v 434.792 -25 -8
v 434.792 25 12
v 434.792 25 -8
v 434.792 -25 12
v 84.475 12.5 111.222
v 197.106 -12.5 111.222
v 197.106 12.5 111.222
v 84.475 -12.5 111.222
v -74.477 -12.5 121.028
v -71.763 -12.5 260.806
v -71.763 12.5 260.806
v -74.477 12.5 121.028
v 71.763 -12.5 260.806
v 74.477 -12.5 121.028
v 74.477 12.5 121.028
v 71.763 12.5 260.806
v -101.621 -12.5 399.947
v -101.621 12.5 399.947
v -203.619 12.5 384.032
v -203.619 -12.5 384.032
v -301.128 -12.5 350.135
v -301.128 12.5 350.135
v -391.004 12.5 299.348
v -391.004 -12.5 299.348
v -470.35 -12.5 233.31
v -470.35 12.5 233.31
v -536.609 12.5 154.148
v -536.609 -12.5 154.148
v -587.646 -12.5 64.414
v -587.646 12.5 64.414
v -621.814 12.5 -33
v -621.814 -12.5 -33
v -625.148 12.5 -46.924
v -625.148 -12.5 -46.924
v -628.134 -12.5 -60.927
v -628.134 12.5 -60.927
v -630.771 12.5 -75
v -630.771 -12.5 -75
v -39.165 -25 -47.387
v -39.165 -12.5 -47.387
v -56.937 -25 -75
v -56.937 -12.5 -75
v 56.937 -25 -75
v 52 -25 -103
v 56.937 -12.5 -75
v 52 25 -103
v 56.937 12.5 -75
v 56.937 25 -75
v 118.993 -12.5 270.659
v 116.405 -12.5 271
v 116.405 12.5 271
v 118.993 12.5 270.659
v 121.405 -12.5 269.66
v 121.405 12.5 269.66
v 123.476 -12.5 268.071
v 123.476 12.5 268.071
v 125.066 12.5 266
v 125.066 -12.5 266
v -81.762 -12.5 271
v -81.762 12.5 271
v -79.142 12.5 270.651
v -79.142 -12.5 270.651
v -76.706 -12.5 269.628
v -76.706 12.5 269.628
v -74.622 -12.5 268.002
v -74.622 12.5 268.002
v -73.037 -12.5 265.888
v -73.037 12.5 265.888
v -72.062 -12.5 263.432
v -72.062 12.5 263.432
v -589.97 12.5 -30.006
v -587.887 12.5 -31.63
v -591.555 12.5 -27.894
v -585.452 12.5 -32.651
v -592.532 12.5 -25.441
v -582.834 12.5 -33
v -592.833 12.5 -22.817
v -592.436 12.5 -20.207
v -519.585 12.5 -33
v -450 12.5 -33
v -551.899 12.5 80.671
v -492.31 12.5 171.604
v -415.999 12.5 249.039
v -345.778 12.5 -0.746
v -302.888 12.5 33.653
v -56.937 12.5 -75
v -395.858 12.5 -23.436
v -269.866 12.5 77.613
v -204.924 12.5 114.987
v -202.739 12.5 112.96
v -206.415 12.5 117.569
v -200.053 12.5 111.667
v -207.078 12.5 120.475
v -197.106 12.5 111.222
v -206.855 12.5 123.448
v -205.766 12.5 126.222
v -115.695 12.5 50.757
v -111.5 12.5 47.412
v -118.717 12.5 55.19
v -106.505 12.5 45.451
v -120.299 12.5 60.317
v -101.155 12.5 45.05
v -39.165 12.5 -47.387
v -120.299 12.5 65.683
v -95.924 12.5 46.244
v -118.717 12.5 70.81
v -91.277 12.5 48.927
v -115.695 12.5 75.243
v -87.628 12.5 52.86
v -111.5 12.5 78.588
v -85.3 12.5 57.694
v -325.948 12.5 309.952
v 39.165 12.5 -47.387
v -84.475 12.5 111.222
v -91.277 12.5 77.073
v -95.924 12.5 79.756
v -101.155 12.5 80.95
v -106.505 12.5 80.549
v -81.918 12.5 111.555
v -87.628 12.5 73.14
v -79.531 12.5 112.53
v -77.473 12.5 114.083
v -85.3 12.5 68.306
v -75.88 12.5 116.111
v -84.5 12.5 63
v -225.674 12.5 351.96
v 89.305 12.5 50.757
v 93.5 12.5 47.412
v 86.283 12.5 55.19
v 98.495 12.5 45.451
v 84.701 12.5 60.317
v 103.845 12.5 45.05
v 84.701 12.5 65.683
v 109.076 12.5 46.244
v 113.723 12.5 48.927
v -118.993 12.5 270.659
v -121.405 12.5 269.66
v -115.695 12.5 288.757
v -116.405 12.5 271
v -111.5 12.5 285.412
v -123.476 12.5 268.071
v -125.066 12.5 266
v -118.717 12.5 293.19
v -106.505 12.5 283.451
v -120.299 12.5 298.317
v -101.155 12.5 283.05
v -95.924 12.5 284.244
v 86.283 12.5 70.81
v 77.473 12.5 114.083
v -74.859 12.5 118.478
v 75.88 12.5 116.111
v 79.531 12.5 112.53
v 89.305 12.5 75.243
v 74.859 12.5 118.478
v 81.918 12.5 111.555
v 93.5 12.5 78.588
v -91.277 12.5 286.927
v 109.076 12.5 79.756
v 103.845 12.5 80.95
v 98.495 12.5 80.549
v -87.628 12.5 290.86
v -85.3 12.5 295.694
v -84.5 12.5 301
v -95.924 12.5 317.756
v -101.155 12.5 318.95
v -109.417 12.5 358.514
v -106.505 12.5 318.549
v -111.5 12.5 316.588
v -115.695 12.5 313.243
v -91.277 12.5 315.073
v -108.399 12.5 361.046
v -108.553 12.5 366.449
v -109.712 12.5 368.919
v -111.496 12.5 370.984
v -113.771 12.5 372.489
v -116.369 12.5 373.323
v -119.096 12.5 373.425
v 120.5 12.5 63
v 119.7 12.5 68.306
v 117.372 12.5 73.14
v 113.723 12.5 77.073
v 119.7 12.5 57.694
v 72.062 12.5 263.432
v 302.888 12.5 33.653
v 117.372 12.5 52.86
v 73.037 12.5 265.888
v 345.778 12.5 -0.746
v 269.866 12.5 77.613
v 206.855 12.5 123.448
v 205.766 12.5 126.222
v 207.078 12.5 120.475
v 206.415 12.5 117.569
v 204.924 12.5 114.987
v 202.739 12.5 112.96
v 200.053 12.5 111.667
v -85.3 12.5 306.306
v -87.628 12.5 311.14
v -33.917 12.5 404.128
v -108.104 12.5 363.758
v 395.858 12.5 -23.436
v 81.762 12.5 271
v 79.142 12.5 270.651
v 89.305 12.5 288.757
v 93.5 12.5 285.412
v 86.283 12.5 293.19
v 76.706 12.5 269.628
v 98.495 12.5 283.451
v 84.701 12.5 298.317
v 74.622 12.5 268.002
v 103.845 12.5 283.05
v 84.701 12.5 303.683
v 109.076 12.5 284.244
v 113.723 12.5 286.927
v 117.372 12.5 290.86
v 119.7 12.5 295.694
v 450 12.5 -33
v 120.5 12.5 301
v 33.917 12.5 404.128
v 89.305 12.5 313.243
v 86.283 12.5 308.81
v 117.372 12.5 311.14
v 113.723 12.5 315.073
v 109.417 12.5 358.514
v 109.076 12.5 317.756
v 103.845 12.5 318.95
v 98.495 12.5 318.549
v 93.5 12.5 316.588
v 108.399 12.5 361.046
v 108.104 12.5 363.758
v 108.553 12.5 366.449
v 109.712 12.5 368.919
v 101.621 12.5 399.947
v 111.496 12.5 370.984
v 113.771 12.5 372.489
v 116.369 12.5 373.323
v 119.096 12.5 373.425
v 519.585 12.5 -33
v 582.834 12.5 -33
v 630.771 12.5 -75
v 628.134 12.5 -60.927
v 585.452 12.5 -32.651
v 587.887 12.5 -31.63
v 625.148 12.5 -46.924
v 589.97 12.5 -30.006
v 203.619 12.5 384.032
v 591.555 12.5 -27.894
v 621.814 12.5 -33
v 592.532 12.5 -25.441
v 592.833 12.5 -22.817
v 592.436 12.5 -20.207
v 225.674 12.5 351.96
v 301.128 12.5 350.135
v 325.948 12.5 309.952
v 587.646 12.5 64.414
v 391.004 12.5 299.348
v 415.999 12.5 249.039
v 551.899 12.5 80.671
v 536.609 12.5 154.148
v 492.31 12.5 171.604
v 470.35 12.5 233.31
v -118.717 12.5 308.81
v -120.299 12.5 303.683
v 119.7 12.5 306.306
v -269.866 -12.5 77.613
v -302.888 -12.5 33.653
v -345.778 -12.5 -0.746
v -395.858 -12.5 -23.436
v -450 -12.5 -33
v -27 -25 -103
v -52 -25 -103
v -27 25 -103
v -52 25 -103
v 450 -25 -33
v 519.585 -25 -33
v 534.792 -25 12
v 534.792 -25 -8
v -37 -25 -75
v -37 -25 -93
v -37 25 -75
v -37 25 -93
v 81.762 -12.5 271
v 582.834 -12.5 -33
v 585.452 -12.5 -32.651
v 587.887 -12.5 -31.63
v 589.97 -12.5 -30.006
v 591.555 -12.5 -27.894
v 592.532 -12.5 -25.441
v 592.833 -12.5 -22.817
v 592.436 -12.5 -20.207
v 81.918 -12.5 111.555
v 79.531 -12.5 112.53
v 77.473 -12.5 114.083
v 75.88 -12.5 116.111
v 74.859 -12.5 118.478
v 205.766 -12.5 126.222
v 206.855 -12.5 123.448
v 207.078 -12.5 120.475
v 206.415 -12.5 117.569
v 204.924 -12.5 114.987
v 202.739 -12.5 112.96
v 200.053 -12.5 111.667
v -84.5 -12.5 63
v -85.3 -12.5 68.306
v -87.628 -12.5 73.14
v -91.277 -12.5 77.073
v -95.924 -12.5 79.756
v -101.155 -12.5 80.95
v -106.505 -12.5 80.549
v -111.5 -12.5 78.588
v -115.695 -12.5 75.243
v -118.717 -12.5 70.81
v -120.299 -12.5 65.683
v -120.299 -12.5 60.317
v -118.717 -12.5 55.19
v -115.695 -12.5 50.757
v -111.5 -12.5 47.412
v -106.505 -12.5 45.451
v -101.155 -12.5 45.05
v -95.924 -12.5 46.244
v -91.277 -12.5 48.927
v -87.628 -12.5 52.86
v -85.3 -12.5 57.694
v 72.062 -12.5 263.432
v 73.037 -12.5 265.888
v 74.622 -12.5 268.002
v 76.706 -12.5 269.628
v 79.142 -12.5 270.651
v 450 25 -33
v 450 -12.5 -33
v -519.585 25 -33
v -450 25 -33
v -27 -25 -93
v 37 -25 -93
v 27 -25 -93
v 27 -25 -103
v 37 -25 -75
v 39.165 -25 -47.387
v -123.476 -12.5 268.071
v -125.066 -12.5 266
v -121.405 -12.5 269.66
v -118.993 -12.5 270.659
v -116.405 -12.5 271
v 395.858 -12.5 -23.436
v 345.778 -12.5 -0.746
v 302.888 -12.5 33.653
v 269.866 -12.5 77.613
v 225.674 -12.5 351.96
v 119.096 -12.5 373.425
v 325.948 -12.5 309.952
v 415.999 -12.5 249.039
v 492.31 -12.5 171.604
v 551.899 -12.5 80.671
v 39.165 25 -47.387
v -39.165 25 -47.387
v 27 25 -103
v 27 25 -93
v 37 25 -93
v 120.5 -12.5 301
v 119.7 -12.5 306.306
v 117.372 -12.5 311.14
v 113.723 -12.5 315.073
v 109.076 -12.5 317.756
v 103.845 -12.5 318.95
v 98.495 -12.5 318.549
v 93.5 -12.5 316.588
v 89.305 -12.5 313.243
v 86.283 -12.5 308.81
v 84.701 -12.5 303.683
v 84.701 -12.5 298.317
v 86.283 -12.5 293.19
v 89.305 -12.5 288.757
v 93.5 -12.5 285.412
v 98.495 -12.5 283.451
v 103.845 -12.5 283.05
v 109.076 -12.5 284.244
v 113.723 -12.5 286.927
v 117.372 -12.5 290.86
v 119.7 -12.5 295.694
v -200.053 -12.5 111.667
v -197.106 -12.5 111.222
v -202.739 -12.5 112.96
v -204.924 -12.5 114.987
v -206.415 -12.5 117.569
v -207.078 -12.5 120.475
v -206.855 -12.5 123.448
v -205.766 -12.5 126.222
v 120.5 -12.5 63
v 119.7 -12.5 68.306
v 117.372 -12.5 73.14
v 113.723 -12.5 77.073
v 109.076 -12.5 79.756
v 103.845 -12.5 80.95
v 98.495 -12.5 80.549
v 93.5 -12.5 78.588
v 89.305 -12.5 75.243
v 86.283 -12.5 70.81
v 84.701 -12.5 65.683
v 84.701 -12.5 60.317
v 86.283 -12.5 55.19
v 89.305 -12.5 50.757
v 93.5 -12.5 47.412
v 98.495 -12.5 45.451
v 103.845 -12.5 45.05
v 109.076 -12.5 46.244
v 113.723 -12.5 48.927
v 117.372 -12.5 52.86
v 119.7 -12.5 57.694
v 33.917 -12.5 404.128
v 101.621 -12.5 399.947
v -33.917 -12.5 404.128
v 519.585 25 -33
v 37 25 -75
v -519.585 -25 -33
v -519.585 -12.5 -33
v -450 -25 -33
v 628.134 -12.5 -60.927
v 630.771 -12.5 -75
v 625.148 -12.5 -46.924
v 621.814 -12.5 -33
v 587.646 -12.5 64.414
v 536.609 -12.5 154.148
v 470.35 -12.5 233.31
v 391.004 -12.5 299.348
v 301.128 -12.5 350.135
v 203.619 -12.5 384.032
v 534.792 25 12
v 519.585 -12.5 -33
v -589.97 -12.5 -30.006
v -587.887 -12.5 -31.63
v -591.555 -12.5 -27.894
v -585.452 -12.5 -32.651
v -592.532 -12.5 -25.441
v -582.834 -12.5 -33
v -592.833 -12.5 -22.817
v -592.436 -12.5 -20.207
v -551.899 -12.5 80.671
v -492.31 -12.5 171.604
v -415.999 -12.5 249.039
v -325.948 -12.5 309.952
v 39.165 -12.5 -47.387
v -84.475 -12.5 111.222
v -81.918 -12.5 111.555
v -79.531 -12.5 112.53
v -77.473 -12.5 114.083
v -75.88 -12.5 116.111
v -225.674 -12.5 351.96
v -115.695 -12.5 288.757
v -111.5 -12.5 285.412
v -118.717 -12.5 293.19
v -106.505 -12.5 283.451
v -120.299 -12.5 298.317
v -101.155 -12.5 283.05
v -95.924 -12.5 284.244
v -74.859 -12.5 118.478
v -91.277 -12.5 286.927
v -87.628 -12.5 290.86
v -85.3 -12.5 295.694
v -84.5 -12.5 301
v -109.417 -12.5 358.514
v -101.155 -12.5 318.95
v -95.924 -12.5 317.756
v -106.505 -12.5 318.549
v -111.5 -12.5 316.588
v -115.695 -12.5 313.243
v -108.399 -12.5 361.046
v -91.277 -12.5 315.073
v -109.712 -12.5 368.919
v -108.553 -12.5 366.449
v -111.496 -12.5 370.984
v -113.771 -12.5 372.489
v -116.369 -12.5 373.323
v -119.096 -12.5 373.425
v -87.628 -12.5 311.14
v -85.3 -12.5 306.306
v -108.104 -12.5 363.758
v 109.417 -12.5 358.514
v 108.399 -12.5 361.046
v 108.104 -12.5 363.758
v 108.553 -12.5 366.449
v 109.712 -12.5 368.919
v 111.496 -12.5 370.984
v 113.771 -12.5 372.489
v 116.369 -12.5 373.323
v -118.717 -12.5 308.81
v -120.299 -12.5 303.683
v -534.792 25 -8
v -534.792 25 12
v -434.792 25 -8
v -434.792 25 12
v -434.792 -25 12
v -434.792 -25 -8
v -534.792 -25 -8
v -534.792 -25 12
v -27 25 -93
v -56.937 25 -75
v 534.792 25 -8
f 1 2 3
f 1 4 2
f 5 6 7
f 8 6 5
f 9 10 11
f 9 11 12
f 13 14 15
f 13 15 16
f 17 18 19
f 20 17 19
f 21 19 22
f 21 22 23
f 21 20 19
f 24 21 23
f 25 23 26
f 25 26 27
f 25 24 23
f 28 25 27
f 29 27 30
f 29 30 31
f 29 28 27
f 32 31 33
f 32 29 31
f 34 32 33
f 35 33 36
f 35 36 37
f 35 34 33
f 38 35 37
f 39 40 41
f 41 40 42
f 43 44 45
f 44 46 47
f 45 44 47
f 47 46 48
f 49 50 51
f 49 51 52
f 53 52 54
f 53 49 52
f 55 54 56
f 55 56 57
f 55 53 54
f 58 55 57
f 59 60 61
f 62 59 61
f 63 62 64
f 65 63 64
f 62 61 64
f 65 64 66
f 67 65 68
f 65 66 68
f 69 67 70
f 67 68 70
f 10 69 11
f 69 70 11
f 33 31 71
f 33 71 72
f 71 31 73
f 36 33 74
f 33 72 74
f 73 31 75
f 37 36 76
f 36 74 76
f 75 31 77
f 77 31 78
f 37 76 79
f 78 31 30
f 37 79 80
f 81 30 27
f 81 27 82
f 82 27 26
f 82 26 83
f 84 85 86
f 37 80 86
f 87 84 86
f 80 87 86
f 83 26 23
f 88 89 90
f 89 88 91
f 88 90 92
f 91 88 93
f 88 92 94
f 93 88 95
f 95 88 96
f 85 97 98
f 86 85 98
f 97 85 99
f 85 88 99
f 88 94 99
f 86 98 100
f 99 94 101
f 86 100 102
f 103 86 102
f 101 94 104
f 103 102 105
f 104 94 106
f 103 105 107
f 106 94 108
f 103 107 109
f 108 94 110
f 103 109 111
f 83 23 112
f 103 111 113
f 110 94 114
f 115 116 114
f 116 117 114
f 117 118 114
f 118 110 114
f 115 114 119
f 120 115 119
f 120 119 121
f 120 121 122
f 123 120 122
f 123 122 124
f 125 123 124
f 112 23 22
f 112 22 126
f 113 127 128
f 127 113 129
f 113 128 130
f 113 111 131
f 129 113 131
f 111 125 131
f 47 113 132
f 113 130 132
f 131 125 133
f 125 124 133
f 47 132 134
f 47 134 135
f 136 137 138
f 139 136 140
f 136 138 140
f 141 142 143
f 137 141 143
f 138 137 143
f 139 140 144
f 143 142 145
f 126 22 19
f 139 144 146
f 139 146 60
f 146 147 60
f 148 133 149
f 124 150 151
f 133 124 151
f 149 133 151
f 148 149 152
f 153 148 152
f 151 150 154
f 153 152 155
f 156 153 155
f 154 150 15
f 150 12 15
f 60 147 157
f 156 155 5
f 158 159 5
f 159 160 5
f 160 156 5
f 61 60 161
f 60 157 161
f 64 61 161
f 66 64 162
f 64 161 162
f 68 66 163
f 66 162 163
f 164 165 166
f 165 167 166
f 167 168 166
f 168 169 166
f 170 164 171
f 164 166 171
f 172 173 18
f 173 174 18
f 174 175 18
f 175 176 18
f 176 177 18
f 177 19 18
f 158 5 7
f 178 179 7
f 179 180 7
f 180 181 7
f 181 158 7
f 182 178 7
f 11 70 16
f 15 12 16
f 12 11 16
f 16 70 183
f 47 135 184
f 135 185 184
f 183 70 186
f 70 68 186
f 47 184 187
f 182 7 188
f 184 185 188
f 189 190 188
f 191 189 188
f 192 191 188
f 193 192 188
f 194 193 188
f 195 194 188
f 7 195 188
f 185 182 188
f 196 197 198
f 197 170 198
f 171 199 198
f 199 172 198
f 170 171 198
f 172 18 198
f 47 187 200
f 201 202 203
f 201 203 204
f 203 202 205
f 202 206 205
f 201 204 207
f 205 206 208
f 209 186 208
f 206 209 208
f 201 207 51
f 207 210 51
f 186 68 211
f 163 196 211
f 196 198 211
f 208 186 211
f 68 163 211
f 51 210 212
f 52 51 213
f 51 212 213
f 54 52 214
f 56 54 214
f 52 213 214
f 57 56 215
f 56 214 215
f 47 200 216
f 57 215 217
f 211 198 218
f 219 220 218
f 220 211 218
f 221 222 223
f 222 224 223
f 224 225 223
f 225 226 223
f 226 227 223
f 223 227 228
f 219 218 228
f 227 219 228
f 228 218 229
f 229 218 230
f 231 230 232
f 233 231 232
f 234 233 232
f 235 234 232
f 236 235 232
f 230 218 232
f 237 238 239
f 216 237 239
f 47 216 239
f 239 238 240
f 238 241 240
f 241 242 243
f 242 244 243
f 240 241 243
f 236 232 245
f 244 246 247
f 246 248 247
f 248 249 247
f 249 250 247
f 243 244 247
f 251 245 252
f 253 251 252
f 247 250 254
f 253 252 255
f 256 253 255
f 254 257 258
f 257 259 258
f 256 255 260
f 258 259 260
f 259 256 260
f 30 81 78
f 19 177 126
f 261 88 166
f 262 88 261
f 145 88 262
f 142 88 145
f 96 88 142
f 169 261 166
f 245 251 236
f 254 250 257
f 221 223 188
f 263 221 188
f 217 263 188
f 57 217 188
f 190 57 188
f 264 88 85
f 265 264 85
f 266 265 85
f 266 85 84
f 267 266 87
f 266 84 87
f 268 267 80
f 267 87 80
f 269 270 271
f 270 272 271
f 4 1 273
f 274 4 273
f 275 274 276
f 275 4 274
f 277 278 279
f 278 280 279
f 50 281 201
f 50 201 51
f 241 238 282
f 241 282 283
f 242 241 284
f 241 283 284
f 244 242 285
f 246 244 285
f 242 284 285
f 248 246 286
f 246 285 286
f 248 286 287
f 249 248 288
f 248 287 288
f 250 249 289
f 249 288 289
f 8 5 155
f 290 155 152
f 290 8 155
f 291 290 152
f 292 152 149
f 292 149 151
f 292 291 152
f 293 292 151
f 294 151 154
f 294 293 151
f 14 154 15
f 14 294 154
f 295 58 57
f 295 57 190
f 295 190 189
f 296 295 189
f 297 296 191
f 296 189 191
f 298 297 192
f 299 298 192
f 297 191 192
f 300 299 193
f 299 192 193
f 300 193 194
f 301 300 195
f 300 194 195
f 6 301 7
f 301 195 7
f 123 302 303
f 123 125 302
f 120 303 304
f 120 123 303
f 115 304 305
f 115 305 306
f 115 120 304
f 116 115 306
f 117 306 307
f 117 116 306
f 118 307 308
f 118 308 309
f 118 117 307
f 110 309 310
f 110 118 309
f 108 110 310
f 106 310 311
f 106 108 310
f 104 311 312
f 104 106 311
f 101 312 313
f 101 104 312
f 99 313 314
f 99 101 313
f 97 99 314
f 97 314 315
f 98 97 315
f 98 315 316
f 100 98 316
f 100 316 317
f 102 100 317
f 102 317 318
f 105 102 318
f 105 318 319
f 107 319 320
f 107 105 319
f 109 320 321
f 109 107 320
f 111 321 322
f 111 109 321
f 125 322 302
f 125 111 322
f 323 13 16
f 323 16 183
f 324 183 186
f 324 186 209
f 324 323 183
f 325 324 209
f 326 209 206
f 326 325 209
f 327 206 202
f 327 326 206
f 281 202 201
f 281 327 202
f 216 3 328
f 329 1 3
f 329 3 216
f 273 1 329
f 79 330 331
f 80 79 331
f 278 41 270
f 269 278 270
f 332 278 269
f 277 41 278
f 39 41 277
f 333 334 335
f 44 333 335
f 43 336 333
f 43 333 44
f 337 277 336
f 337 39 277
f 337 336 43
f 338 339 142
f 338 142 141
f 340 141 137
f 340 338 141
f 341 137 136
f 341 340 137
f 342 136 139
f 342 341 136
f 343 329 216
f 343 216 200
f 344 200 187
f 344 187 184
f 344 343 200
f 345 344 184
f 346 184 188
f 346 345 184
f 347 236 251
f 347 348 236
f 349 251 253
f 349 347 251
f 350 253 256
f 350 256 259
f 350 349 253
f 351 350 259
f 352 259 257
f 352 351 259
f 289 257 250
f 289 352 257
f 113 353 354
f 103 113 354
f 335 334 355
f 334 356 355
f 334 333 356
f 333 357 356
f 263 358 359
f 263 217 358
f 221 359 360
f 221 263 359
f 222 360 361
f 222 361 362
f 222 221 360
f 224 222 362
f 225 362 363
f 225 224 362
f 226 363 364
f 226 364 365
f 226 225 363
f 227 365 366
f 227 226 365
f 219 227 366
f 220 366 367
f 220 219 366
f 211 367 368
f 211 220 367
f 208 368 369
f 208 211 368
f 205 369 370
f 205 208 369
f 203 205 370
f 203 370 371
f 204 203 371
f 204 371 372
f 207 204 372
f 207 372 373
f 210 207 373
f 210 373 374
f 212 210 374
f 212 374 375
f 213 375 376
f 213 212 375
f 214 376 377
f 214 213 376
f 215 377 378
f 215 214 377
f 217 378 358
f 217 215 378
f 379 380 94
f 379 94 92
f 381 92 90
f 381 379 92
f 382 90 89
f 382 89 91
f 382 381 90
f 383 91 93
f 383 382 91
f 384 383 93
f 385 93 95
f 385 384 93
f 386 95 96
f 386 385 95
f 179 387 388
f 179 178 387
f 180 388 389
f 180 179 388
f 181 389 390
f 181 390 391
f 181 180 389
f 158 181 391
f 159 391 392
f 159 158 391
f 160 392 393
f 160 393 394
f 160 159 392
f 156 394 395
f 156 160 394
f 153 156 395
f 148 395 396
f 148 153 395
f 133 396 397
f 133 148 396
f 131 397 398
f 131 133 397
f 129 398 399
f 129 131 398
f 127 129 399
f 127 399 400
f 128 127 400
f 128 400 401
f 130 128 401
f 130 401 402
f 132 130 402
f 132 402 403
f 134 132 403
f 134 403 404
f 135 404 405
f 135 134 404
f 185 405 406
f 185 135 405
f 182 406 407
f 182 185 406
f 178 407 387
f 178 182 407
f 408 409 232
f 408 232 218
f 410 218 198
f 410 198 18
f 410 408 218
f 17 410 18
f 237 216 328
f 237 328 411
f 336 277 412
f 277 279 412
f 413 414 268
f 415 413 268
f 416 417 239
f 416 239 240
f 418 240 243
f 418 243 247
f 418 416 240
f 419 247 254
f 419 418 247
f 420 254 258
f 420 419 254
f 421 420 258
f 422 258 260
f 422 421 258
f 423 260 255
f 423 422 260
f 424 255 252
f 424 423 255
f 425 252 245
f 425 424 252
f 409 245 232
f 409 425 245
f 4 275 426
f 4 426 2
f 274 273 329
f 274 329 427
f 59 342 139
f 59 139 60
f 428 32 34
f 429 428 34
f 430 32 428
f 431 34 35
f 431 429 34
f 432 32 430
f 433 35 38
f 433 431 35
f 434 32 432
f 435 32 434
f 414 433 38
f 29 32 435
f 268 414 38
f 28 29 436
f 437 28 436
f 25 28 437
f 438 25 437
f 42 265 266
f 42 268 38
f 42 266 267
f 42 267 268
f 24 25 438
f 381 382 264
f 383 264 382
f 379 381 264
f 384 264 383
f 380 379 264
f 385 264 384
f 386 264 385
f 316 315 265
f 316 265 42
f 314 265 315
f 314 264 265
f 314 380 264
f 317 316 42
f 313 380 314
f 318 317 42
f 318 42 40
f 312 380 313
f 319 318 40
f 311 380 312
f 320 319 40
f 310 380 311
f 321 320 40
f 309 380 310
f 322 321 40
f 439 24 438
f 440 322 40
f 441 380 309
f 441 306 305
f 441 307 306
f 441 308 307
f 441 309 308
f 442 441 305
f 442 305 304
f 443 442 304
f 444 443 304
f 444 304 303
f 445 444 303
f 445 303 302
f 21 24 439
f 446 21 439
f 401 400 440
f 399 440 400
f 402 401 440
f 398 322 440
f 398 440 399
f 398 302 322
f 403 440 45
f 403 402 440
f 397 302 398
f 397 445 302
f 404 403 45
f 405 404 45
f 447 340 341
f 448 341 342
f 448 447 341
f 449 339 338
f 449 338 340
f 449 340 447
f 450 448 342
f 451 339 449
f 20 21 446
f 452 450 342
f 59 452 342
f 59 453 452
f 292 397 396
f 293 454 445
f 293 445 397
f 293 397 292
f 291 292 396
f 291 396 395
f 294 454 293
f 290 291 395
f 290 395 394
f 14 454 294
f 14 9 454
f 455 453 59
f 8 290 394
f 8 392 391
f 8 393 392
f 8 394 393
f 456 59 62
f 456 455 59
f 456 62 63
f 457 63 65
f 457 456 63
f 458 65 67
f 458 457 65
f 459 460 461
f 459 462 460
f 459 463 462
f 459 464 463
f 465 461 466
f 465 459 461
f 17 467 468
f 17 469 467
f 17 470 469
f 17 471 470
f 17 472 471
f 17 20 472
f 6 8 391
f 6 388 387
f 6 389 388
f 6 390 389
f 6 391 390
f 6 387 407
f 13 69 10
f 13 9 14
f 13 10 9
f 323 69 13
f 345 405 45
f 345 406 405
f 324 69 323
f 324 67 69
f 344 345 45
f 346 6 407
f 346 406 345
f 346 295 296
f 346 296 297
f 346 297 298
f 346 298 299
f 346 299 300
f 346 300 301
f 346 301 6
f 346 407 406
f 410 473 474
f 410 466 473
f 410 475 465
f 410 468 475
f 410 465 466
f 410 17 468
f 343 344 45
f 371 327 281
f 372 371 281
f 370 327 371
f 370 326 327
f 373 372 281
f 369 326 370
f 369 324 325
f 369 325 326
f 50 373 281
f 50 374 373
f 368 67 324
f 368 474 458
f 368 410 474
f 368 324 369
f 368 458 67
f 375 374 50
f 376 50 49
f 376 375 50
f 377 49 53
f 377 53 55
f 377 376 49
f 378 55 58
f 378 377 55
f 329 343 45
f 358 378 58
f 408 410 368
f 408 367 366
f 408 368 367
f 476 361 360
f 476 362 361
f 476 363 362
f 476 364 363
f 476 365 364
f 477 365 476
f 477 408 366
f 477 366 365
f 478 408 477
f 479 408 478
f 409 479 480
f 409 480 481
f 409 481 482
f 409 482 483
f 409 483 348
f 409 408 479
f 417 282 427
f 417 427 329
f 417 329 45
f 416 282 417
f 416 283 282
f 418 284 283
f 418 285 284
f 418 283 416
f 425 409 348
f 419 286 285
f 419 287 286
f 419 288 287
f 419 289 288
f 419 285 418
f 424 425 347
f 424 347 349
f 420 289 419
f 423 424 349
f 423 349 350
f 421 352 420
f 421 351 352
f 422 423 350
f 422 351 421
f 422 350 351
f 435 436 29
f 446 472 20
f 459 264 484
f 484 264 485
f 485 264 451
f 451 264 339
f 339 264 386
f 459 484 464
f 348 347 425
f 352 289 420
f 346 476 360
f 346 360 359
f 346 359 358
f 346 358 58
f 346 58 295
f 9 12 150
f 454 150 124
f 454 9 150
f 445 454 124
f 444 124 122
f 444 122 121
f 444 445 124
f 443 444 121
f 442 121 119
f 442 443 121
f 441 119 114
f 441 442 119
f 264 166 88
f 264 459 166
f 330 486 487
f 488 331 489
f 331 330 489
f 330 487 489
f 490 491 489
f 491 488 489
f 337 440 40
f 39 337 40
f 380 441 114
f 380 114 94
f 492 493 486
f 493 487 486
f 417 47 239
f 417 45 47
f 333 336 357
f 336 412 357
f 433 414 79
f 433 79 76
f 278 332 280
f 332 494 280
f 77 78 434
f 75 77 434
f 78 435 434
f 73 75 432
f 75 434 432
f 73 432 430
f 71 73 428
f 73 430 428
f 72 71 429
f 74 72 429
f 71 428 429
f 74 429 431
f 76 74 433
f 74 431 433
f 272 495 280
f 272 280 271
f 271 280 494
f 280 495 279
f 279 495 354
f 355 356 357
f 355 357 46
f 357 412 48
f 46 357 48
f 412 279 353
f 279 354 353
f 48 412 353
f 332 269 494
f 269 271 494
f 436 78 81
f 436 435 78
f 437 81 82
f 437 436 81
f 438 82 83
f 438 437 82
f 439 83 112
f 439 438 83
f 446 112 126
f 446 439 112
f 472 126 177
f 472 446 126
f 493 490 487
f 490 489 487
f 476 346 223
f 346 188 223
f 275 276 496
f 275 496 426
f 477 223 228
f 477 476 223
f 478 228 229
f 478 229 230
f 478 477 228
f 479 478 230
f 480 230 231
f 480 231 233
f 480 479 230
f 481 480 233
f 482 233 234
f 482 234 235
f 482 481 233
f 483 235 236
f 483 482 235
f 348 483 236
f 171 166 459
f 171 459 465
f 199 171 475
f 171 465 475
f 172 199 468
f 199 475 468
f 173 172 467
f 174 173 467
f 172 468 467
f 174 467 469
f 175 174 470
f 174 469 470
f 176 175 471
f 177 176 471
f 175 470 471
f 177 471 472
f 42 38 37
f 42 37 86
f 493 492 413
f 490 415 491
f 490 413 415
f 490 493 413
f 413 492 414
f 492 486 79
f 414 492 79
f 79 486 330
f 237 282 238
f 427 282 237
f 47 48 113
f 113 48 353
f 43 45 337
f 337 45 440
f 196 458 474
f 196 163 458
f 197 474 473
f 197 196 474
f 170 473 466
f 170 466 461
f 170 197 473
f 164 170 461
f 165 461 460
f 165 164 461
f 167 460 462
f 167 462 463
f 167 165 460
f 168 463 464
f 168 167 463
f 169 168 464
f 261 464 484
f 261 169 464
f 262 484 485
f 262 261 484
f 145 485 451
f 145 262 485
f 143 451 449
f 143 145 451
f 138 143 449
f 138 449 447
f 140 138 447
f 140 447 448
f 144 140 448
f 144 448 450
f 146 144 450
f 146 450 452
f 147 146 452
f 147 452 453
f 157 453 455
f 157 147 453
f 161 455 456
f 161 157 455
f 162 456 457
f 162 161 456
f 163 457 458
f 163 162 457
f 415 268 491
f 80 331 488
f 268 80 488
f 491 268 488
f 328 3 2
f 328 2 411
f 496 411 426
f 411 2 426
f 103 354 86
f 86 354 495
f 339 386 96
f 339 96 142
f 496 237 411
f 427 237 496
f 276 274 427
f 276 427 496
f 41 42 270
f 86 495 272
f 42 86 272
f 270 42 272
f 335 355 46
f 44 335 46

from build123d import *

# Parameters (mm, degrees)
F0_R     = 18
F1_DEPTH = 12.5
F2_R     = 10
F3_DEPTH = 25


# Not quite as in the source:
# - a feature names something its author has since deleted; it is built from what else it names


with BuildPart() as f1:
    # F0 (on Front) → F1 (new body, symmetric)
    with BuildSketch(Plane.XZ):
        with BuildLine():
            Line((56.9371554598, -75), (595.9911190147, -75))
            Line((595.9911190147, -75), (595.9911190147, -33))
            Line((595.9911190147, -33), (519.5849960263, -33))
            Line((519.5849960263, -33), (450, -33))
            ThreePointArc((450, -33), (345.7777045638, -0.7457623443), (269.8662378191, 77.6128487294))
            Line((269.8662378191, 77.6128487294), (100, 375))
            Line((100, 375), (0, 375))
            Line((0, 375), (-100, 375))
            Line((-100, 375), (-269.8662378191, 77.6128487294))
            ThreePointArc((-269.8662378191, 77.6128487294), (-345.7777045638, -0.7457623443), (-450, -33))
            Line((-450, -33), (-484.7924980132, -33))
            Line((-484.7924980132, -33), (-519.5849960263, -33))
            Line((-519.5849960263, -33), (-595.9911190147, -33))
            Line((-595.9911190147, -33), (-595.9911190147, -75))
            Line((-595.9911190147, -75), (-56.9371554598, -75))
            Line((-56.9371554598, -75), (-39.1645557923, -47.3871512706))
            Line((-39.1645557923, -47.3871512706), (3.3388429378, -47.3871512706))
            Line((3.3388429378, -47.3871512706), (39.1645557923, -47.3871512706))
            Line((39.1645557923, -47.3871512706), (56.9371554598, -75))
        make_face()
        with Locations((-102.5, 63)):
            Circle(F0_R, mode=Mode.SUBTRACT)
        with Locations((102.5, 63)):
            Circle(F0_R, mode=Mode.SUBTRACT)
        with BuildLine():
            ThreePointArc((-74.4771999255, 121.0282629209), (-77.4732139948, 114.0830094681), (-84.4753157308, 111.2223771768))
            Line((-84.4753157308, 111.2223771768), (-197.1059338565, 111.2223771768))
            ThreePointArc((-197.1059338565, 111.2223771768), (-205.7661878943, 116.2223771768), (-205.7661878943, 126.2223771768))
            Line((-205.7661878943, 126.2223771768), (-125.0655397306, 266))
            ThreePointArc((-125.0655397306, 266), (-121.4052856928, 269.6602540378), (-116.4052856928, 271))
            Line((-116.4052856928, 271), (-81.7615214746, 271))
            ThreePointArc((-81.7615214746, 271), (-74.622153766, 268.0021017359), (-71.7634056693, 260.8058857441))
            Line((-71.7634056693, 260.8058857441), (-74.4771999255, 121.0282629209))
        make_face(mode=Mode.SUBTRACT)
        with Locations((-102.5, 301)):
            Circle(F0_R, mode=Mode.SUBTRACT)
        with BuildLine():
            ThreePointArc((84.4753157308, 111.2223771768), (77.4732139948, 114.0830094681), (74.4771999255, 121.0282629209))
            Line((74.4771999255, 121.0282629209), (71.7634056693, 260.8058857441))
            ThreePointArc((71.7634056693, 260.8058857441), (74.622153766, 268.0021017359), (81.7615214746, 271))
            Line((81.7615214746, 271), (116.4052856928, 271))
            ThreePointArc((116.4052856928, 271), (121.4052856928, 269.6602540378), (125.0655397306, 266))
            Line((125.0655397306, 266), (205.7661878943, 126.2223771768))
            ThreePointArc((205.7661878943, 126.2223771768), (205.7661878943, 116.2223771768), (197.1059338565, 111.2223771768))
            Line((197.1059338565, 111.2223771768), (84.4753157308, 111.2223771768))
        make_face(mode=Mode.SUBTRACT)
        with Locations((102.5, 301)):
            Circle(F0_R, mode=Mode.SUBTRACT)
        with BuildLine():
            ThreePointArc((100, 375), (413.732568712, 250.914148912), (595.9911190147, -33))
            Line((595.9911190147, -33), (621.814123166, -33))
            ThreePointArc((621.814123166, -33), (432.1619331745, 268.1134366241), (101.6213617791, 399.9473683177))
            ThreePointArc((101.6213617791, 399.9473683177), (0, 404.6514727579), (-101.6213617791, 399.9473683177))
            ThreePointArc((-101.6213617791, 399.9473683177), (-432.1619331745, 268.1134366241), (-621.814123166, -33))
            Line((-621.814123166, -33), (-595.9911190147, -33))
            ThreePointArc((-595.9911190147, -33), (-413.732568712, 250.914148912), (-100, 375))
            Line((-100, 375), (0, 375))
            Line((0, 375), (100, 375))
        make_face()
        with BuildLine():
            Line((-595.9911190147, -75), (-595.9911190147, -33))
            Line((-595.9911190147, -33), (-621.814123166, -33))
            ThreePointArc((-621.814123166, -33), (-626.6847460238, -53.9163527136), (-630.7708927375, -75))
            Line((-630.7708927375, -75), (-595.9911190147, -75))
        make_face()
        with BuildLine():
            Line((595.9911190147, -33), (595.9911190147, -75))
            Line((595.9911190147, -75), (630.7708927375, -75))
            ThreePointArc((630.7708927375, -75), (626.6847460238, -53.9163527136), (621.814123166, -33))
            Line((621.814123166, -33), (595.9911190147, -33))
        make_face()
    extrude(amount=F1_DEPTH, both=True)

    # F2
    f2_edges = [f1.edges().sort_by_distance(p)[0] for p in [
        (-100, 0, 375),
        (100, 0, 375),
        (595.991119, 0, -33),
        (-595.991119, 0, -33),
    ]]
    fillet(f2_edges, radius=F2_R)

    # F0 (on Front) → F3 (join, symmetric)
    with BuildSketch(Plane.XZ):
        Polygon((-484.7924980132, -33), (-450, -33), (-434.7924980132, -8), (-434.7924980132, 12), (-484.7924980132, 12), (-534.7924980132, 12), (-534.7924980132, -8), (-519.5849960263, -33), align=None)
        Polygon((37, -75), (56.9371554598, -75), (39.1645557923, -47.3871512706), (3.3388429378, -47.3871512706), (-39.1645557923, -47.3871512706), (-56.9371554598, -75), (-37, -75), (0, -75), align=None)
        Polygon((52, -103), (56.9371554598, -75), (37, -75), (37, -93), (27, -93), (27, -103), align=None)
        Polygon((-37, -93), (-37, -75), (-56.9371554598, -75), (-52, -103), (-27, -103), (-27, -93), align=None)
        Polygon((450, -33), (519.5849960263, -33), (534.7924980132, -8), (534.7924980132, 12), (484.7924980132, 12), (434.7924980132, 12), (434.7924980132, -8), align=None)
    extrude(amount=F3_DEPTH, both=True)


solid = f1.part
